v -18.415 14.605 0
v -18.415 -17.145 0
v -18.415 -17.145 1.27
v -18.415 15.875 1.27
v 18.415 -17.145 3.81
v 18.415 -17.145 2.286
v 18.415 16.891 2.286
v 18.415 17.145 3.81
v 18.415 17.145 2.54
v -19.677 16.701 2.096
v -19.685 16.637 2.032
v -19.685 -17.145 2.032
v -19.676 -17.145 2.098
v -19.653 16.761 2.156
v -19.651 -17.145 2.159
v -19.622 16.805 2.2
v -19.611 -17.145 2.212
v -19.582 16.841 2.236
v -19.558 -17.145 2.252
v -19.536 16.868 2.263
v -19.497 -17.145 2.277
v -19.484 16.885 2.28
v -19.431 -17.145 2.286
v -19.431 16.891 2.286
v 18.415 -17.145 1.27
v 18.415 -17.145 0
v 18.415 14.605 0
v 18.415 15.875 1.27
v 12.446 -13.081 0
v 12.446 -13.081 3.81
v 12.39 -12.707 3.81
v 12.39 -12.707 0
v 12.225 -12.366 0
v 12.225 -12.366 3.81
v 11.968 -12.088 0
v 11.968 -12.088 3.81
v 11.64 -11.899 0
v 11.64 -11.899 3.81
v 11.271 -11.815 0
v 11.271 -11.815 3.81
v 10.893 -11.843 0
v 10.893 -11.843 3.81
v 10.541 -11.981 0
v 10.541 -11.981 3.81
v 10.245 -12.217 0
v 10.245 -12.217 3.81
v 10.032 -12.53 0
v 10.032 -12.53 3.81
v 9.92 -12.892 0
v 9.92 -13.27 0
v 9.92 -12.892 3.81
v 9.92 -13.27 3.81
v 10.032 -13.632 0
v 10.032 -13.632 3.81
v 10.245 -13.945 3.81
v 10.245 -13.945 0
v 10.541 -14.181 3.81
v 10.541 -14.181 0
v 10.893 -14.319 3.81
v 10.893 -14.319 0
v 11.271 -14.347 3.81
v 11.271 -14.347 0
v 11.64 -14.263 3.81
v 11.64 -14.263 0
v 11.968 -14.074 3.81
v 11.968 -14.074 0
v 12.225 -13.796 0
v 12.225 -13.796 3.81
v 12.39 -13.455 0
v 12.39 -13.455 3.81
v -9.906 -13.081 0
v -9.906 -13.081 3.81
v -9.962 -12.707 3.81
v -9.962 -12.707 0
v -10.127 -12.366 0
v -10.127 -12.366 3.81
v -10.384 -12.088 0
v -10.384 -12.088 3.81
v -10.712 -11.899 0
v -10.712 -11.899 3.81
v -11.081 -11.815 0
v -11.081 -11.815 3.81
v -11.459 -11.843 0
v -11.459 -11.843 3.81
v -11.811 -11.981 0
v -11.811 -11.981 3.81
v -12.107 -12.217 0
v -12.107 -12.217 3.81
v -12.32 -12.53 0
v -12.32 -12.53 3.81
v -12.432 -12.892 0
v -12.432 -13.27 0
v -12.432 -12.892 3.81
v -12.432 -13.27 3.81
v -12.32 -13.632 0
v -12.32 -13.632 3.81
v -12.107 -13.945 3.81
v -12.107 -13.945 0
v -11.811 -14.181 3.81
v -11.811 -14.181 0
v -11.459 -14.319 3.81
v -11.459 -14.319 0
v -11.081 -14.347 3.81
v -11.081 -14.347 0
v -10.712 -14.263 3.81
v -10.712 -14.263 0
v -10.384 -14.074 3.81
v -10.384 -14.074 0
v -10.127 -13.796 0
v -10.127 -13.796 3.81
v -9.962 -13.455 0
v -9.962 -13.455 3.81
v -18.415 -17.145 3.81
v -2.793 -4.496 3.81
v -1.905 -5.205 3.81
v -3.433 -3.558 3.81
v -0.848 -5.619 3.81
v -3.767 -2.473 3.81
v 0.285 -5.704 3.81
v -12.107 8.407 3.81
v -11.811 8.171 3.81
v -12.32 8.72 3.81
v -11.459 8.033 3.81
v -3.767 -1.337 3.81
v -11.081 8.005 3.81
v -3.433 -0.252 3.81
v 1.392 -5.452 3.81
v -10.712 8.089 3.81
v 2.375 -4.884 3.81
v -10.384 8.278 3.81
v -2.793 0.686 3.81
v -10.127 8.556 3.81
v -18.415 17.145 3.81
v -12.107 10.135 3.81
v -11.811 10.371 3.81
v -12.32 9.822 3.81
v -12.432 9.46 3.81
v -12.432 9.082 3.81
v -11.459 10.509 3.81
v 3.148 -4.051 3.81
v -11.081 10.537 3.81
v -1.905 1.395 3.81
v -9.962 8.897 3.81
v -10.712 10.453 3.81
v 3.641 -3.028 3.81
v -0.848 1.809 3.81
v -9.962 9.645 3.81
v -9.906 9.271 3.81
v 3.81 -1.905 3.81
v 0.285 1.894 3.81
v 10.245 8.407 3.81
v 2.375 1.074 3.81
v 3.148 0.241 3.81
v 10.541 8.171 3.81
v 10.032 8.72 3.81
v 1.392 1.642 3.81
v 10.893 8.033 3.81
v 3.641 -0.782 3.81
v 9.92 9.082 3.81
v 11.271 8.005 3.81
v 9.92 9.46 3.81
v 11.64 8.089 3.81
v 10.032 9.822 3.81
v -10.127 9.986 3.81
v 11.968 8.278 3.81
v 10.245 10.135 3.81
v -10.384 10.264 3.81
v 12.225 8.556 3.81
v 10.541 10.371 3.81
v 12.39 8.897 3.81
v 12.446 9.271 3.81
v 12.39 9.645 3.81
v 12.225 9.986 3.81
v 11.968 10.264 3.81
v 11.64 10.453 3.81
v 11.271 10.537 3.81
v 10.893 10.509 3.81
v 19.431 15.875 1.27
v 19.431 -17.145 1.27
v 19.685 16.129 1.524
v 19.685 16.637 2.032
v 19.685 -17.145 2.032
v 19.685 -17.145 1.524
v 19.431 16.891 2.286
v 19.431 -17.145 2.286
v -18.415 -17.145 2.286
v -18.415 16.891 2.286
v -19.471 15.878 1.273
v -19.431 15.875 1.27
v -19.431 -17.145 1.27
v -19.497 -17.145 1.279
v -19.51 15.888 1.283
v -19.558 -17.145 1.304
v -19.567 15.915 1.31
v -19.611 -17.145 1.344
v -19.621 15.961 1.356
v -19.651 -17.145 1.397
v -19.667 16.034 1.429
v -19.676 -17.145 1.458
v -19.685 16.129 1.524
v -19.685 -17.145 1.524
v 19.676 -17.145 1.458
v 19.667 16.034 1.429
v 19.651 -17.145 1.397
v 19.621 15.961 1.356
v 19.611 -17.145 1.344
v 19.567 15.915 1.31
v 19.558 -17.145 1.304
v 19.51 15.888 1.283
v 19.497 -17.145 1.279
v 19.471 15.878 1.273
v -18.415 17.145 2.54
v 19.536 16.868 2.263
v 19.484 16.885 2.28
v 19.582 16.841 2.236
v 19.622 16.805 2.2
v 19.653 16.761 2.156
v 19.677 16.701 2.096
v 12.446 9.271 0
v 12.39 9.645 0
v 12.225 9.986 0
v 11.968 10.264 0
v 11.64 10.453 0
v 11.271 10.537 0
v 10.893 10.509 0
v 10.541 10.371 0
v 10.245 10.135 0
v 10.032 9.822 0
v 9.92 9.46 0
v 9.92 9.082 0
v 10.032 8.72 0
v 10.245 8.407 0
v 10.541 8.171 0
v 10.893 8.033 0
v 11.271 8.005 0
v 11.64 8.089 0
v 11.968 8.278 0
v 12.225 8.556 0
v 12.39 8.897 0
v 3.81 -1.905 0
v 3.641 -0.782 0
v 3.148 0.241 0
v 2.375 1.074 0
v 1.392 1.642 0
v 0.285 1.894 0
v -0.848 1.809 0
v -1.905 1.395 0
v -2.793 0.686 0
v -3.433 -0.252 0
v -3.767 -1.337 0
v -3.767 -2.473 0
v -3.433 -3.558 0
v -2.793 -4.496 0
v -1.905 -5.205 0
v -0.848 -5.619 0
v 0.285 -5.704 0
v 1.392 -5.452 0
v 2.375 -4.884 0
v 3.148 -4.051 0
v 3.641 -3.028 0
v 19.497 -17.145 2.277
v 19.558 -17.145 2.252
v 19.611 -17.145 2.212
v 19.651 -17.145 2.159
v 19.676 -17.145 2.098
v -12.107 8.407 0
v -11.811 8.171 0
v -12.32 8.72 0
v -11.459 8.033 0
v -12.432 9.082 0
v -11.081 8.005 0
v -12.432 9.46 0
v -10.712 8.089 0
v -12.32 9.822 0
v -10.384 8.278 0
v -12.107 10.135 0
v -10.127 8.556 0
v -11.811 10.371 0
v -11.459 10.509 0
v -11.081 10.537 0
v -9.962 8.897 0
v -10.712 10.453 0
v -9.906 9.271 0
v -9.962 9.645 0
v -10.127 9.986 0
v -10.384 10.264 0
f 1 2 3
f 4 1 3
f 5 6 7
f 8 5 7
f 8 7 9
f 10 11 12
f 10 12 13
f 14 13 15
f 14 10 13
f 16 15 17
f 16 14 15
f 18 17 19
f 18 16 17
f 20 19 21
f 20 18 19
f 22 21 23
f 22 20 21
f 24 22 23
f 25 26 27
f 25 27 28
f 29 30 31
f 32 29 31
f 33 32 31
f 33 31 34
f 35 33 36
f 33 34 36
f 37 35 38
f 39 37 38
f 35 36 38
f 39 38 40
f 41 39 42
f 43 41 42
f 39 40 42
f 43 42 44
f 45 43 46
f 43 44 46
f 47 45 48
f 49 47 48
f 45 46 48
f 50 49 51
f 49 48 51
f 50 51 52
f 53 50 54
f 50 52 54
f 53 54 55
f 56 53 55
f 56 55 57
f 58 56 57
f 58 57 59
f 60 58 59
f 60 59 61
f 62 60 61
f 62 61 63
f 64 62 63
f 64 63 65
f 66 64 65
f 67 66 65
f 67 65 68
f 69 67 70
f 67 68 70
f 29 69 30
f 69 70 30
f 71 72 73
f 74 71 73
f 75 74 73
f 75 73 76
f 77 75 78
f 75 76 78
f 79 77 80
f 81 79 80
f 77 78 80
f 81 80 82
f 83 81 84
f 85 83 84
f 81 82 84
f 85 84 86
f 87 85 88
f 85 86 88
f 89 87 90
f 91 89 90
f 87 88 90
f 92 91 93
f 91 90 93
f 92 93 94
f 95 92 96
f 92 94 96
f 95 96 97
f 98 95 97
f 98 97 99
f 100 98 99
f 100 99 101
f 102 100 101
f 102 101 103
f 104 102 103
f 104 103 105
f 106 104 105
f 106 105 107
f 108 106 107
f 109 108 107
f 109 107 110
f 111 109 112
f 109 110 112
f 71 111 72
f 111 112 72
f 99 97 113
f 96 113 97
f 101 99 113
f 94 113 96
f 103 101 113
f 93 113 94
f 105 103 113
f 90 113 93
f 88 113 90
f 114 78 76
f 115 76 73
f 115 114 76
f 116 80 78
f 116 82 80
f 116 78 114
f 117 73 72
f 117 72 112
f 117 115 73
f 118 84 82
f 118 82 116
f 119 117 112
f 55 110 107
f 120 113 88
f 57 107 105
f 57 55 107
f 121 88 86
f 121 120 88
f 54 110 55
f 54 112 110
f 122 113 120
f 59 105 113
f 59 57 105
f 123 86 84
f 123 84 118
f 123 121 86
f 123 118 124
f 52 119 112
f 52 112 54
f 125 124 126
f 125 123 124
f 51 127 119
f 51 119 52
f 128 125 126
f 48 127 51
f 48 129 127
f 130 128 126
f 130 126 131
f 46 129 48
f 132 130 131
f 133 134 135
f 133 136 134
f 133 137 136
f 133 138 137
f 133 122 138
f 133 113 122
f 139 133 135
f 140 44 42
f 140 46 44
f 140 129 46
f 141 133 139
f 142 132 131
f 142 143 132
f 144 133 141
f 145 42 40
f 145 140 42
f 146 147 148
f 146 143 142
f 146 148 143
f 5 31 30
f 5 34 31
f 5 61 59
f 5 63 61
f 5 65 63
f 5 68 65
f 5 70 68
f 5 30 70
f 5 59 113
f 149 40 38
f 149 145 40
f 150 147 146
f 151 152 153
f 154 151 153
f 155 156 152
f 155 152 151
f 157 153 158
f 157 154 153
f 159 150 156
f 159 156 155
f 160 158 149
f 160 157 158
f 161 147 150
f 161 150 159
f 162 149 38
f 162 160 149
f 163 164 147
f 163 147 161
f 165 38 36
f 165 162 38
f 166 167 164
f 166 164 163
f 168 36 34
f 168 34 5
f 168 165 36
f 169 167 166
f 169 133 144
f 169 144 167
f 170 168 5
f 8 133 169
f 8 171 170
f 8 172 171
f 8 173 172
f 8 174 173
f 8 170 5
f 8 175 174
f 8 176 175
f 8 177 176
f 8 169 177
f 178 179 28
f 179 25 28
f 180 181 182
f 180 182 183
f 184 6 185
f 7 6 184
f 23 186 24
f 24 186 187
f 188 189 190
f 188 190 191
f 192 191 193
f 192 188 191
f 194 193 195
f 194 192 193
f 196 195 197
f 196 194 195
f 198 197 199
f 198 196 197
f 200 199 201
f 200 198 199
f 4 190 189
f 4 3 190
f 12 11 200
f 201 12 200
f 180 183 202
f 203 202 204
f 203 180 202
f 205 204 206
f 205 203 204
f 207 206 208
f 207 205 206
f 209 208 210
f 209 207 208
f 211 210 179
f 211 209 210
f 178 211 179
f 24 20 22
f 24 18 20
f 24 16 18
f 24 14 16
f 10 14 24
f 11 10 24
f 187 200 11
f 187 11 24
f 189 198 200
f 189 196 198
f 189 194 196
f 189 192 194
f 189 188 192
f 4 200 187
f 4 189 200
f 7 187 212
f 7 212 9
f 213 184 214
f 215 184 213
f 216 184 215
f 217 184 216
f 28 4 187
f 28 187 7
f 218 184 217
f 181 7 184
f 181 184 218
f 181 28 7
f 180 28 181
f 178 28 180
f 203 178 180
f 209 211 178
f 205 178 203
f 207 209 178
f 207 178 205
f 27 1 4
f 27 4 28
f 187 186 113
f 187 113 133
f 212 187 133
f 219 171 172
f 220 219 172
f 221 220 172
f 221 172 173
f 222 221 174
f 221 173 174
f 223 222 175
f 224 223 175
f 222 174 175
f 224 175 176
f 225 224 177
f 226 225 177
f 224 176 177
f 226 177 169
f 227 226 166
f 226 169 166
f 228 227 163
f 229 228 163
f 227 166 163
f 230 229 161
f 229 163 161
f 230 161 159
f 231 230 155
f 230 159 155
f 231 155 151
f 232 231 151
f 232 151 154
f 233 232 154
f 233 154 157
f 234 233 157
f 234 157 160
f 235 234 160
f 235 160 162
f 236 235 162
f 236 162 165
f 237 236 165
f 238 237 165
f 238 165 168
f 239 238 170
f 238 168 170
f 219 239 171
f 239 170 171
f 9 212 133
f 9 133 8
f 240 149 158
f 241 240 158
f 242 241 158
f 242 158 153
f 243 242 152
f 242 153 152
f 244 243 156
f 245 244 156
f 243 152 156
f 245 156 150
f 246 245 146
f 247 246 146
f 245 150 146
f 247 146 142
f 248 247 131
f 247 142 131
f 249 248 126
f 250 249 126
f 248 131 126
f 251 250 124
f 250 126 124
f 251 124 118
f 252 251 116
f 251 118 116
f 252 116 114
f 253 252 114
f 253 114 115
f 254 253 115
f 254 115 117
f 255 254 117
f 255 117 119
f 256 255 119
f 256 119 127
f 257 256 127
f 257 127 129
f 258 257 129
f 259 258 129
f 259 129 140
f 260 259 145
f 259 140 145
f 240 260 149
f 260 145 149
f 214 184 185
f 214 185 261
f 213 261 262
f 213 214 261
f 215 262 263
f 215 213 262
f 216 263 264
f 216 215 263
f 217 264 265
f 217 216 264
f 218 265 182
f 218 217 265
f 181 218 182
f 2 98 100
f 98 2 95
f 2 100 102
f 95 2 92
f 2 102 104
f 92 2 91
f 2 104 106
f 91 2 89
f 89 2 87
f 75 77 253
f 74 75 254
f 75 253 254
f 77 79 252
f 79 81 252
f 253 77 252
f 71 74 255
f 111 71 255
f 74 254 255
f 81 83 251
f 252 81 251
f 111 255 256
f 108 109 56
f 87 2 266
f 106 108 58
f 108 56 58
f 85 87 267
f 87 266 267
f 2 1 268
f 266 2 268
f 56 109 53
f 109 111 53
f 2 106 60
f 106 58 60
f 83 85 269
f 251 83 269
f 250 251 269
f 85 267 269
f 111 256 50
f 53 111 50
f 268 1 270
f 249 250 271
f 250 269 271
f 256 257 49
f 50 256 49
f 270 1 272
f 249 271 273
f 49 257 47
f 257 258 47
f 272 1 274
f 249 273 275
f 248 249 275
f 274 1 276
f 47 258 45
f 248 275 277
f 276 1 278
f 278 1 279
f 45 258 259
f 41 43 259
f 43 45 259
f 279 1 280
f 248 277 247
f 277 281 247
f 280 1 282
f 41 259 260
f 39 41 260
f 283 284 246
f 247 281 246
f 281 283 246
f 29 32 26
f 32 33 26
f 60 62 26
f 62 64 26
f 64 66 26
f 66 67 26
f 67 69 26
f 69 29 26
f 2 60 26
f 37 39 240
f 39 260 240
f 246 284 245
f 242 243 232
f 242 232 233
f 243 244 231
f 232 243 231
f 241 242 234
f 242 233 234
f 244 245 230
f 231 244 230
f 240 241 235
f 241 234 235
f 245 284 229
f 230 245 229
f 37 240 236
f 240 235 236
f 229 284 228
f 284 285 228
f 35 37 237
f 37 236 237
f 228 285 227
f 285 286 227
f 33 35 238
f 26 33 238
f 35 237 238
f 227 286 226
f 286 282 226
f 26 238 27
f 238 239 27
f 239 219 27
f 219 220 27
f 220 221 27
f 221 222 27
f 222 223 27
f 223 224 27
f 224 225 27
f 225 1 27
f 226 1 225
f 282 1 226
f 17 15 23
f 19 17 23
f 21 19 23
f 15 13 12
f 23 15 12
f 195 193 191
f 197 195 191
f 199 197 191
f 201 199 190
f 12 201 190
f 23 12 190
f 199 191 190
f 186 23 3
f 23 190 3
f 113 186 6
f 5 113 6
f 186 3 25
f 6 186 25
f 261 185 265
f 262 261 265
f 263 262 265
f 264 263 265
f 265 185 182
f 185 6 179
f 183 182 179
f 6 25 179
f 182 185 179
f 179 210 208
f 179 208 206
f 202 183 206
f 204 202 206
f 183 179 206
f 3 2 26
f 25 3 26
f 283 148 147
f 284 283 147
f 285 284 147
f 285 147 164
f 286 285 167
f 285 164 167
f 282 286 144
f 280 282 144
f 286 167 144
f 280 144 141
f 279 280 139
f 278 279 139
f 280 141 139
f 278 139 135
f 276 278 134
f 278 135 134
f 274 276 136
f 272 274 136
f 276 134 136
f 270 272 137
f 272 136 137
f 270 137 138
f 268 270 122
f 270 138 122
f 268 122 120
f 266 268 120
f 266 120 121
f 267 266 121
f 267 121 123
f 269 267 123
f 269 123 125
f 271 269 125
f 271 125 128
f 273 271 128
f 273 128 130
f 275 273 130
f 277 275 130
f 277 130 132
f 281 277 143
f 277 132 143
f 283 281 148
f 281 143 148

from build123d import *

# Parameters (mm, degrees)
SKETCH1_W           = 36.83
SKETCH1_H           = 34.29
BOSS_EXTRUDE1_DEPTH = 3.81
SKETCH2_W           = 1.016
SKETCH2_H           = 34.29
BOSS_EXTRUDE2_DEPTH = 1.27
FILLET1_R           = 0.254
SKETCH3_R           = 3.81
SKETCH3_R_2         = 1.27
CUT_EXTRUDE1_DEPTH  = 3.81
CHAMFER1_SIZE       = 2.54


with BuildPart() as part:
    # Sketch1 → Boss-Extrude1 (new body)
    with BuildSketch(Plane.XY):
        Rectangle(SKETCH1_W, SKETCH1_H)
    extrude(amount=BOSS_EXTRUDE1_DEPTH)

    # Sketch2 → Boss-Extrude2 (add)
    with BuildSketch(Plane(origin=(18.415, 0, 0), x_dir=(0, 0, -1), z_dir=(1, 0, 0))):
        with Locations((-1.778, 0)):
            Rectangle(SKETCH2_W, SKETCH2_H)
    boss_extrude2 = extrude(amount=BOSS_EXTRUDE2_DEPTH)

    # Mirror1: Boss-Extrude2 across plane
    add(boss_extrude2.mirror(Plane(origin=(0, 0, 0), x_dir=(0, 0, 1), z_dir=(1, 0, 0))))

    # Fillet1
    fillet1_edges = [part.edges().sort_by_distance(p)[0] for p in [
        (19.685, 0, 2.286),
        (19.685, 0, 1.27),
        (-19.685, 0, 2.286),
        (-19.685, 0, 1.27),
    ]]
    fillet(fillet1_edges, radius=FILLET1_R)

    # Sketch3 → Cut-Extrude1 (cut)
    with BuildSketch(Plane.XY.offset(3.81)):
        with Locations((0, -1.905)):
            Circle(SKETCH3_R)
        with Locations((-11.176, 9.271)):
            Circle(SKETCH3_R_2)
        with Locations((11.176, 9.271)):
            Circle(SKETCH3_R_2)
        with Locations((11.176, -13.081)):
            Circle(SKETCH3_R_2)
        with Locations((-11.176, -13.081)):
            Circle(SKETCH3_R_2)
    extrude(amount=-CUT_EXTRUDE1_DEPTH, mode=Mode.SUBTRACT)

    # Chamfer1
    chamfer1_edges = [part.edges().sort_by_distance(p)[0] for p in [
        (0, 17.145, 0),
    ]]
    chamfer(chamfer1_edges, length=CHAMFER1_SIZE)


solid = part.part
